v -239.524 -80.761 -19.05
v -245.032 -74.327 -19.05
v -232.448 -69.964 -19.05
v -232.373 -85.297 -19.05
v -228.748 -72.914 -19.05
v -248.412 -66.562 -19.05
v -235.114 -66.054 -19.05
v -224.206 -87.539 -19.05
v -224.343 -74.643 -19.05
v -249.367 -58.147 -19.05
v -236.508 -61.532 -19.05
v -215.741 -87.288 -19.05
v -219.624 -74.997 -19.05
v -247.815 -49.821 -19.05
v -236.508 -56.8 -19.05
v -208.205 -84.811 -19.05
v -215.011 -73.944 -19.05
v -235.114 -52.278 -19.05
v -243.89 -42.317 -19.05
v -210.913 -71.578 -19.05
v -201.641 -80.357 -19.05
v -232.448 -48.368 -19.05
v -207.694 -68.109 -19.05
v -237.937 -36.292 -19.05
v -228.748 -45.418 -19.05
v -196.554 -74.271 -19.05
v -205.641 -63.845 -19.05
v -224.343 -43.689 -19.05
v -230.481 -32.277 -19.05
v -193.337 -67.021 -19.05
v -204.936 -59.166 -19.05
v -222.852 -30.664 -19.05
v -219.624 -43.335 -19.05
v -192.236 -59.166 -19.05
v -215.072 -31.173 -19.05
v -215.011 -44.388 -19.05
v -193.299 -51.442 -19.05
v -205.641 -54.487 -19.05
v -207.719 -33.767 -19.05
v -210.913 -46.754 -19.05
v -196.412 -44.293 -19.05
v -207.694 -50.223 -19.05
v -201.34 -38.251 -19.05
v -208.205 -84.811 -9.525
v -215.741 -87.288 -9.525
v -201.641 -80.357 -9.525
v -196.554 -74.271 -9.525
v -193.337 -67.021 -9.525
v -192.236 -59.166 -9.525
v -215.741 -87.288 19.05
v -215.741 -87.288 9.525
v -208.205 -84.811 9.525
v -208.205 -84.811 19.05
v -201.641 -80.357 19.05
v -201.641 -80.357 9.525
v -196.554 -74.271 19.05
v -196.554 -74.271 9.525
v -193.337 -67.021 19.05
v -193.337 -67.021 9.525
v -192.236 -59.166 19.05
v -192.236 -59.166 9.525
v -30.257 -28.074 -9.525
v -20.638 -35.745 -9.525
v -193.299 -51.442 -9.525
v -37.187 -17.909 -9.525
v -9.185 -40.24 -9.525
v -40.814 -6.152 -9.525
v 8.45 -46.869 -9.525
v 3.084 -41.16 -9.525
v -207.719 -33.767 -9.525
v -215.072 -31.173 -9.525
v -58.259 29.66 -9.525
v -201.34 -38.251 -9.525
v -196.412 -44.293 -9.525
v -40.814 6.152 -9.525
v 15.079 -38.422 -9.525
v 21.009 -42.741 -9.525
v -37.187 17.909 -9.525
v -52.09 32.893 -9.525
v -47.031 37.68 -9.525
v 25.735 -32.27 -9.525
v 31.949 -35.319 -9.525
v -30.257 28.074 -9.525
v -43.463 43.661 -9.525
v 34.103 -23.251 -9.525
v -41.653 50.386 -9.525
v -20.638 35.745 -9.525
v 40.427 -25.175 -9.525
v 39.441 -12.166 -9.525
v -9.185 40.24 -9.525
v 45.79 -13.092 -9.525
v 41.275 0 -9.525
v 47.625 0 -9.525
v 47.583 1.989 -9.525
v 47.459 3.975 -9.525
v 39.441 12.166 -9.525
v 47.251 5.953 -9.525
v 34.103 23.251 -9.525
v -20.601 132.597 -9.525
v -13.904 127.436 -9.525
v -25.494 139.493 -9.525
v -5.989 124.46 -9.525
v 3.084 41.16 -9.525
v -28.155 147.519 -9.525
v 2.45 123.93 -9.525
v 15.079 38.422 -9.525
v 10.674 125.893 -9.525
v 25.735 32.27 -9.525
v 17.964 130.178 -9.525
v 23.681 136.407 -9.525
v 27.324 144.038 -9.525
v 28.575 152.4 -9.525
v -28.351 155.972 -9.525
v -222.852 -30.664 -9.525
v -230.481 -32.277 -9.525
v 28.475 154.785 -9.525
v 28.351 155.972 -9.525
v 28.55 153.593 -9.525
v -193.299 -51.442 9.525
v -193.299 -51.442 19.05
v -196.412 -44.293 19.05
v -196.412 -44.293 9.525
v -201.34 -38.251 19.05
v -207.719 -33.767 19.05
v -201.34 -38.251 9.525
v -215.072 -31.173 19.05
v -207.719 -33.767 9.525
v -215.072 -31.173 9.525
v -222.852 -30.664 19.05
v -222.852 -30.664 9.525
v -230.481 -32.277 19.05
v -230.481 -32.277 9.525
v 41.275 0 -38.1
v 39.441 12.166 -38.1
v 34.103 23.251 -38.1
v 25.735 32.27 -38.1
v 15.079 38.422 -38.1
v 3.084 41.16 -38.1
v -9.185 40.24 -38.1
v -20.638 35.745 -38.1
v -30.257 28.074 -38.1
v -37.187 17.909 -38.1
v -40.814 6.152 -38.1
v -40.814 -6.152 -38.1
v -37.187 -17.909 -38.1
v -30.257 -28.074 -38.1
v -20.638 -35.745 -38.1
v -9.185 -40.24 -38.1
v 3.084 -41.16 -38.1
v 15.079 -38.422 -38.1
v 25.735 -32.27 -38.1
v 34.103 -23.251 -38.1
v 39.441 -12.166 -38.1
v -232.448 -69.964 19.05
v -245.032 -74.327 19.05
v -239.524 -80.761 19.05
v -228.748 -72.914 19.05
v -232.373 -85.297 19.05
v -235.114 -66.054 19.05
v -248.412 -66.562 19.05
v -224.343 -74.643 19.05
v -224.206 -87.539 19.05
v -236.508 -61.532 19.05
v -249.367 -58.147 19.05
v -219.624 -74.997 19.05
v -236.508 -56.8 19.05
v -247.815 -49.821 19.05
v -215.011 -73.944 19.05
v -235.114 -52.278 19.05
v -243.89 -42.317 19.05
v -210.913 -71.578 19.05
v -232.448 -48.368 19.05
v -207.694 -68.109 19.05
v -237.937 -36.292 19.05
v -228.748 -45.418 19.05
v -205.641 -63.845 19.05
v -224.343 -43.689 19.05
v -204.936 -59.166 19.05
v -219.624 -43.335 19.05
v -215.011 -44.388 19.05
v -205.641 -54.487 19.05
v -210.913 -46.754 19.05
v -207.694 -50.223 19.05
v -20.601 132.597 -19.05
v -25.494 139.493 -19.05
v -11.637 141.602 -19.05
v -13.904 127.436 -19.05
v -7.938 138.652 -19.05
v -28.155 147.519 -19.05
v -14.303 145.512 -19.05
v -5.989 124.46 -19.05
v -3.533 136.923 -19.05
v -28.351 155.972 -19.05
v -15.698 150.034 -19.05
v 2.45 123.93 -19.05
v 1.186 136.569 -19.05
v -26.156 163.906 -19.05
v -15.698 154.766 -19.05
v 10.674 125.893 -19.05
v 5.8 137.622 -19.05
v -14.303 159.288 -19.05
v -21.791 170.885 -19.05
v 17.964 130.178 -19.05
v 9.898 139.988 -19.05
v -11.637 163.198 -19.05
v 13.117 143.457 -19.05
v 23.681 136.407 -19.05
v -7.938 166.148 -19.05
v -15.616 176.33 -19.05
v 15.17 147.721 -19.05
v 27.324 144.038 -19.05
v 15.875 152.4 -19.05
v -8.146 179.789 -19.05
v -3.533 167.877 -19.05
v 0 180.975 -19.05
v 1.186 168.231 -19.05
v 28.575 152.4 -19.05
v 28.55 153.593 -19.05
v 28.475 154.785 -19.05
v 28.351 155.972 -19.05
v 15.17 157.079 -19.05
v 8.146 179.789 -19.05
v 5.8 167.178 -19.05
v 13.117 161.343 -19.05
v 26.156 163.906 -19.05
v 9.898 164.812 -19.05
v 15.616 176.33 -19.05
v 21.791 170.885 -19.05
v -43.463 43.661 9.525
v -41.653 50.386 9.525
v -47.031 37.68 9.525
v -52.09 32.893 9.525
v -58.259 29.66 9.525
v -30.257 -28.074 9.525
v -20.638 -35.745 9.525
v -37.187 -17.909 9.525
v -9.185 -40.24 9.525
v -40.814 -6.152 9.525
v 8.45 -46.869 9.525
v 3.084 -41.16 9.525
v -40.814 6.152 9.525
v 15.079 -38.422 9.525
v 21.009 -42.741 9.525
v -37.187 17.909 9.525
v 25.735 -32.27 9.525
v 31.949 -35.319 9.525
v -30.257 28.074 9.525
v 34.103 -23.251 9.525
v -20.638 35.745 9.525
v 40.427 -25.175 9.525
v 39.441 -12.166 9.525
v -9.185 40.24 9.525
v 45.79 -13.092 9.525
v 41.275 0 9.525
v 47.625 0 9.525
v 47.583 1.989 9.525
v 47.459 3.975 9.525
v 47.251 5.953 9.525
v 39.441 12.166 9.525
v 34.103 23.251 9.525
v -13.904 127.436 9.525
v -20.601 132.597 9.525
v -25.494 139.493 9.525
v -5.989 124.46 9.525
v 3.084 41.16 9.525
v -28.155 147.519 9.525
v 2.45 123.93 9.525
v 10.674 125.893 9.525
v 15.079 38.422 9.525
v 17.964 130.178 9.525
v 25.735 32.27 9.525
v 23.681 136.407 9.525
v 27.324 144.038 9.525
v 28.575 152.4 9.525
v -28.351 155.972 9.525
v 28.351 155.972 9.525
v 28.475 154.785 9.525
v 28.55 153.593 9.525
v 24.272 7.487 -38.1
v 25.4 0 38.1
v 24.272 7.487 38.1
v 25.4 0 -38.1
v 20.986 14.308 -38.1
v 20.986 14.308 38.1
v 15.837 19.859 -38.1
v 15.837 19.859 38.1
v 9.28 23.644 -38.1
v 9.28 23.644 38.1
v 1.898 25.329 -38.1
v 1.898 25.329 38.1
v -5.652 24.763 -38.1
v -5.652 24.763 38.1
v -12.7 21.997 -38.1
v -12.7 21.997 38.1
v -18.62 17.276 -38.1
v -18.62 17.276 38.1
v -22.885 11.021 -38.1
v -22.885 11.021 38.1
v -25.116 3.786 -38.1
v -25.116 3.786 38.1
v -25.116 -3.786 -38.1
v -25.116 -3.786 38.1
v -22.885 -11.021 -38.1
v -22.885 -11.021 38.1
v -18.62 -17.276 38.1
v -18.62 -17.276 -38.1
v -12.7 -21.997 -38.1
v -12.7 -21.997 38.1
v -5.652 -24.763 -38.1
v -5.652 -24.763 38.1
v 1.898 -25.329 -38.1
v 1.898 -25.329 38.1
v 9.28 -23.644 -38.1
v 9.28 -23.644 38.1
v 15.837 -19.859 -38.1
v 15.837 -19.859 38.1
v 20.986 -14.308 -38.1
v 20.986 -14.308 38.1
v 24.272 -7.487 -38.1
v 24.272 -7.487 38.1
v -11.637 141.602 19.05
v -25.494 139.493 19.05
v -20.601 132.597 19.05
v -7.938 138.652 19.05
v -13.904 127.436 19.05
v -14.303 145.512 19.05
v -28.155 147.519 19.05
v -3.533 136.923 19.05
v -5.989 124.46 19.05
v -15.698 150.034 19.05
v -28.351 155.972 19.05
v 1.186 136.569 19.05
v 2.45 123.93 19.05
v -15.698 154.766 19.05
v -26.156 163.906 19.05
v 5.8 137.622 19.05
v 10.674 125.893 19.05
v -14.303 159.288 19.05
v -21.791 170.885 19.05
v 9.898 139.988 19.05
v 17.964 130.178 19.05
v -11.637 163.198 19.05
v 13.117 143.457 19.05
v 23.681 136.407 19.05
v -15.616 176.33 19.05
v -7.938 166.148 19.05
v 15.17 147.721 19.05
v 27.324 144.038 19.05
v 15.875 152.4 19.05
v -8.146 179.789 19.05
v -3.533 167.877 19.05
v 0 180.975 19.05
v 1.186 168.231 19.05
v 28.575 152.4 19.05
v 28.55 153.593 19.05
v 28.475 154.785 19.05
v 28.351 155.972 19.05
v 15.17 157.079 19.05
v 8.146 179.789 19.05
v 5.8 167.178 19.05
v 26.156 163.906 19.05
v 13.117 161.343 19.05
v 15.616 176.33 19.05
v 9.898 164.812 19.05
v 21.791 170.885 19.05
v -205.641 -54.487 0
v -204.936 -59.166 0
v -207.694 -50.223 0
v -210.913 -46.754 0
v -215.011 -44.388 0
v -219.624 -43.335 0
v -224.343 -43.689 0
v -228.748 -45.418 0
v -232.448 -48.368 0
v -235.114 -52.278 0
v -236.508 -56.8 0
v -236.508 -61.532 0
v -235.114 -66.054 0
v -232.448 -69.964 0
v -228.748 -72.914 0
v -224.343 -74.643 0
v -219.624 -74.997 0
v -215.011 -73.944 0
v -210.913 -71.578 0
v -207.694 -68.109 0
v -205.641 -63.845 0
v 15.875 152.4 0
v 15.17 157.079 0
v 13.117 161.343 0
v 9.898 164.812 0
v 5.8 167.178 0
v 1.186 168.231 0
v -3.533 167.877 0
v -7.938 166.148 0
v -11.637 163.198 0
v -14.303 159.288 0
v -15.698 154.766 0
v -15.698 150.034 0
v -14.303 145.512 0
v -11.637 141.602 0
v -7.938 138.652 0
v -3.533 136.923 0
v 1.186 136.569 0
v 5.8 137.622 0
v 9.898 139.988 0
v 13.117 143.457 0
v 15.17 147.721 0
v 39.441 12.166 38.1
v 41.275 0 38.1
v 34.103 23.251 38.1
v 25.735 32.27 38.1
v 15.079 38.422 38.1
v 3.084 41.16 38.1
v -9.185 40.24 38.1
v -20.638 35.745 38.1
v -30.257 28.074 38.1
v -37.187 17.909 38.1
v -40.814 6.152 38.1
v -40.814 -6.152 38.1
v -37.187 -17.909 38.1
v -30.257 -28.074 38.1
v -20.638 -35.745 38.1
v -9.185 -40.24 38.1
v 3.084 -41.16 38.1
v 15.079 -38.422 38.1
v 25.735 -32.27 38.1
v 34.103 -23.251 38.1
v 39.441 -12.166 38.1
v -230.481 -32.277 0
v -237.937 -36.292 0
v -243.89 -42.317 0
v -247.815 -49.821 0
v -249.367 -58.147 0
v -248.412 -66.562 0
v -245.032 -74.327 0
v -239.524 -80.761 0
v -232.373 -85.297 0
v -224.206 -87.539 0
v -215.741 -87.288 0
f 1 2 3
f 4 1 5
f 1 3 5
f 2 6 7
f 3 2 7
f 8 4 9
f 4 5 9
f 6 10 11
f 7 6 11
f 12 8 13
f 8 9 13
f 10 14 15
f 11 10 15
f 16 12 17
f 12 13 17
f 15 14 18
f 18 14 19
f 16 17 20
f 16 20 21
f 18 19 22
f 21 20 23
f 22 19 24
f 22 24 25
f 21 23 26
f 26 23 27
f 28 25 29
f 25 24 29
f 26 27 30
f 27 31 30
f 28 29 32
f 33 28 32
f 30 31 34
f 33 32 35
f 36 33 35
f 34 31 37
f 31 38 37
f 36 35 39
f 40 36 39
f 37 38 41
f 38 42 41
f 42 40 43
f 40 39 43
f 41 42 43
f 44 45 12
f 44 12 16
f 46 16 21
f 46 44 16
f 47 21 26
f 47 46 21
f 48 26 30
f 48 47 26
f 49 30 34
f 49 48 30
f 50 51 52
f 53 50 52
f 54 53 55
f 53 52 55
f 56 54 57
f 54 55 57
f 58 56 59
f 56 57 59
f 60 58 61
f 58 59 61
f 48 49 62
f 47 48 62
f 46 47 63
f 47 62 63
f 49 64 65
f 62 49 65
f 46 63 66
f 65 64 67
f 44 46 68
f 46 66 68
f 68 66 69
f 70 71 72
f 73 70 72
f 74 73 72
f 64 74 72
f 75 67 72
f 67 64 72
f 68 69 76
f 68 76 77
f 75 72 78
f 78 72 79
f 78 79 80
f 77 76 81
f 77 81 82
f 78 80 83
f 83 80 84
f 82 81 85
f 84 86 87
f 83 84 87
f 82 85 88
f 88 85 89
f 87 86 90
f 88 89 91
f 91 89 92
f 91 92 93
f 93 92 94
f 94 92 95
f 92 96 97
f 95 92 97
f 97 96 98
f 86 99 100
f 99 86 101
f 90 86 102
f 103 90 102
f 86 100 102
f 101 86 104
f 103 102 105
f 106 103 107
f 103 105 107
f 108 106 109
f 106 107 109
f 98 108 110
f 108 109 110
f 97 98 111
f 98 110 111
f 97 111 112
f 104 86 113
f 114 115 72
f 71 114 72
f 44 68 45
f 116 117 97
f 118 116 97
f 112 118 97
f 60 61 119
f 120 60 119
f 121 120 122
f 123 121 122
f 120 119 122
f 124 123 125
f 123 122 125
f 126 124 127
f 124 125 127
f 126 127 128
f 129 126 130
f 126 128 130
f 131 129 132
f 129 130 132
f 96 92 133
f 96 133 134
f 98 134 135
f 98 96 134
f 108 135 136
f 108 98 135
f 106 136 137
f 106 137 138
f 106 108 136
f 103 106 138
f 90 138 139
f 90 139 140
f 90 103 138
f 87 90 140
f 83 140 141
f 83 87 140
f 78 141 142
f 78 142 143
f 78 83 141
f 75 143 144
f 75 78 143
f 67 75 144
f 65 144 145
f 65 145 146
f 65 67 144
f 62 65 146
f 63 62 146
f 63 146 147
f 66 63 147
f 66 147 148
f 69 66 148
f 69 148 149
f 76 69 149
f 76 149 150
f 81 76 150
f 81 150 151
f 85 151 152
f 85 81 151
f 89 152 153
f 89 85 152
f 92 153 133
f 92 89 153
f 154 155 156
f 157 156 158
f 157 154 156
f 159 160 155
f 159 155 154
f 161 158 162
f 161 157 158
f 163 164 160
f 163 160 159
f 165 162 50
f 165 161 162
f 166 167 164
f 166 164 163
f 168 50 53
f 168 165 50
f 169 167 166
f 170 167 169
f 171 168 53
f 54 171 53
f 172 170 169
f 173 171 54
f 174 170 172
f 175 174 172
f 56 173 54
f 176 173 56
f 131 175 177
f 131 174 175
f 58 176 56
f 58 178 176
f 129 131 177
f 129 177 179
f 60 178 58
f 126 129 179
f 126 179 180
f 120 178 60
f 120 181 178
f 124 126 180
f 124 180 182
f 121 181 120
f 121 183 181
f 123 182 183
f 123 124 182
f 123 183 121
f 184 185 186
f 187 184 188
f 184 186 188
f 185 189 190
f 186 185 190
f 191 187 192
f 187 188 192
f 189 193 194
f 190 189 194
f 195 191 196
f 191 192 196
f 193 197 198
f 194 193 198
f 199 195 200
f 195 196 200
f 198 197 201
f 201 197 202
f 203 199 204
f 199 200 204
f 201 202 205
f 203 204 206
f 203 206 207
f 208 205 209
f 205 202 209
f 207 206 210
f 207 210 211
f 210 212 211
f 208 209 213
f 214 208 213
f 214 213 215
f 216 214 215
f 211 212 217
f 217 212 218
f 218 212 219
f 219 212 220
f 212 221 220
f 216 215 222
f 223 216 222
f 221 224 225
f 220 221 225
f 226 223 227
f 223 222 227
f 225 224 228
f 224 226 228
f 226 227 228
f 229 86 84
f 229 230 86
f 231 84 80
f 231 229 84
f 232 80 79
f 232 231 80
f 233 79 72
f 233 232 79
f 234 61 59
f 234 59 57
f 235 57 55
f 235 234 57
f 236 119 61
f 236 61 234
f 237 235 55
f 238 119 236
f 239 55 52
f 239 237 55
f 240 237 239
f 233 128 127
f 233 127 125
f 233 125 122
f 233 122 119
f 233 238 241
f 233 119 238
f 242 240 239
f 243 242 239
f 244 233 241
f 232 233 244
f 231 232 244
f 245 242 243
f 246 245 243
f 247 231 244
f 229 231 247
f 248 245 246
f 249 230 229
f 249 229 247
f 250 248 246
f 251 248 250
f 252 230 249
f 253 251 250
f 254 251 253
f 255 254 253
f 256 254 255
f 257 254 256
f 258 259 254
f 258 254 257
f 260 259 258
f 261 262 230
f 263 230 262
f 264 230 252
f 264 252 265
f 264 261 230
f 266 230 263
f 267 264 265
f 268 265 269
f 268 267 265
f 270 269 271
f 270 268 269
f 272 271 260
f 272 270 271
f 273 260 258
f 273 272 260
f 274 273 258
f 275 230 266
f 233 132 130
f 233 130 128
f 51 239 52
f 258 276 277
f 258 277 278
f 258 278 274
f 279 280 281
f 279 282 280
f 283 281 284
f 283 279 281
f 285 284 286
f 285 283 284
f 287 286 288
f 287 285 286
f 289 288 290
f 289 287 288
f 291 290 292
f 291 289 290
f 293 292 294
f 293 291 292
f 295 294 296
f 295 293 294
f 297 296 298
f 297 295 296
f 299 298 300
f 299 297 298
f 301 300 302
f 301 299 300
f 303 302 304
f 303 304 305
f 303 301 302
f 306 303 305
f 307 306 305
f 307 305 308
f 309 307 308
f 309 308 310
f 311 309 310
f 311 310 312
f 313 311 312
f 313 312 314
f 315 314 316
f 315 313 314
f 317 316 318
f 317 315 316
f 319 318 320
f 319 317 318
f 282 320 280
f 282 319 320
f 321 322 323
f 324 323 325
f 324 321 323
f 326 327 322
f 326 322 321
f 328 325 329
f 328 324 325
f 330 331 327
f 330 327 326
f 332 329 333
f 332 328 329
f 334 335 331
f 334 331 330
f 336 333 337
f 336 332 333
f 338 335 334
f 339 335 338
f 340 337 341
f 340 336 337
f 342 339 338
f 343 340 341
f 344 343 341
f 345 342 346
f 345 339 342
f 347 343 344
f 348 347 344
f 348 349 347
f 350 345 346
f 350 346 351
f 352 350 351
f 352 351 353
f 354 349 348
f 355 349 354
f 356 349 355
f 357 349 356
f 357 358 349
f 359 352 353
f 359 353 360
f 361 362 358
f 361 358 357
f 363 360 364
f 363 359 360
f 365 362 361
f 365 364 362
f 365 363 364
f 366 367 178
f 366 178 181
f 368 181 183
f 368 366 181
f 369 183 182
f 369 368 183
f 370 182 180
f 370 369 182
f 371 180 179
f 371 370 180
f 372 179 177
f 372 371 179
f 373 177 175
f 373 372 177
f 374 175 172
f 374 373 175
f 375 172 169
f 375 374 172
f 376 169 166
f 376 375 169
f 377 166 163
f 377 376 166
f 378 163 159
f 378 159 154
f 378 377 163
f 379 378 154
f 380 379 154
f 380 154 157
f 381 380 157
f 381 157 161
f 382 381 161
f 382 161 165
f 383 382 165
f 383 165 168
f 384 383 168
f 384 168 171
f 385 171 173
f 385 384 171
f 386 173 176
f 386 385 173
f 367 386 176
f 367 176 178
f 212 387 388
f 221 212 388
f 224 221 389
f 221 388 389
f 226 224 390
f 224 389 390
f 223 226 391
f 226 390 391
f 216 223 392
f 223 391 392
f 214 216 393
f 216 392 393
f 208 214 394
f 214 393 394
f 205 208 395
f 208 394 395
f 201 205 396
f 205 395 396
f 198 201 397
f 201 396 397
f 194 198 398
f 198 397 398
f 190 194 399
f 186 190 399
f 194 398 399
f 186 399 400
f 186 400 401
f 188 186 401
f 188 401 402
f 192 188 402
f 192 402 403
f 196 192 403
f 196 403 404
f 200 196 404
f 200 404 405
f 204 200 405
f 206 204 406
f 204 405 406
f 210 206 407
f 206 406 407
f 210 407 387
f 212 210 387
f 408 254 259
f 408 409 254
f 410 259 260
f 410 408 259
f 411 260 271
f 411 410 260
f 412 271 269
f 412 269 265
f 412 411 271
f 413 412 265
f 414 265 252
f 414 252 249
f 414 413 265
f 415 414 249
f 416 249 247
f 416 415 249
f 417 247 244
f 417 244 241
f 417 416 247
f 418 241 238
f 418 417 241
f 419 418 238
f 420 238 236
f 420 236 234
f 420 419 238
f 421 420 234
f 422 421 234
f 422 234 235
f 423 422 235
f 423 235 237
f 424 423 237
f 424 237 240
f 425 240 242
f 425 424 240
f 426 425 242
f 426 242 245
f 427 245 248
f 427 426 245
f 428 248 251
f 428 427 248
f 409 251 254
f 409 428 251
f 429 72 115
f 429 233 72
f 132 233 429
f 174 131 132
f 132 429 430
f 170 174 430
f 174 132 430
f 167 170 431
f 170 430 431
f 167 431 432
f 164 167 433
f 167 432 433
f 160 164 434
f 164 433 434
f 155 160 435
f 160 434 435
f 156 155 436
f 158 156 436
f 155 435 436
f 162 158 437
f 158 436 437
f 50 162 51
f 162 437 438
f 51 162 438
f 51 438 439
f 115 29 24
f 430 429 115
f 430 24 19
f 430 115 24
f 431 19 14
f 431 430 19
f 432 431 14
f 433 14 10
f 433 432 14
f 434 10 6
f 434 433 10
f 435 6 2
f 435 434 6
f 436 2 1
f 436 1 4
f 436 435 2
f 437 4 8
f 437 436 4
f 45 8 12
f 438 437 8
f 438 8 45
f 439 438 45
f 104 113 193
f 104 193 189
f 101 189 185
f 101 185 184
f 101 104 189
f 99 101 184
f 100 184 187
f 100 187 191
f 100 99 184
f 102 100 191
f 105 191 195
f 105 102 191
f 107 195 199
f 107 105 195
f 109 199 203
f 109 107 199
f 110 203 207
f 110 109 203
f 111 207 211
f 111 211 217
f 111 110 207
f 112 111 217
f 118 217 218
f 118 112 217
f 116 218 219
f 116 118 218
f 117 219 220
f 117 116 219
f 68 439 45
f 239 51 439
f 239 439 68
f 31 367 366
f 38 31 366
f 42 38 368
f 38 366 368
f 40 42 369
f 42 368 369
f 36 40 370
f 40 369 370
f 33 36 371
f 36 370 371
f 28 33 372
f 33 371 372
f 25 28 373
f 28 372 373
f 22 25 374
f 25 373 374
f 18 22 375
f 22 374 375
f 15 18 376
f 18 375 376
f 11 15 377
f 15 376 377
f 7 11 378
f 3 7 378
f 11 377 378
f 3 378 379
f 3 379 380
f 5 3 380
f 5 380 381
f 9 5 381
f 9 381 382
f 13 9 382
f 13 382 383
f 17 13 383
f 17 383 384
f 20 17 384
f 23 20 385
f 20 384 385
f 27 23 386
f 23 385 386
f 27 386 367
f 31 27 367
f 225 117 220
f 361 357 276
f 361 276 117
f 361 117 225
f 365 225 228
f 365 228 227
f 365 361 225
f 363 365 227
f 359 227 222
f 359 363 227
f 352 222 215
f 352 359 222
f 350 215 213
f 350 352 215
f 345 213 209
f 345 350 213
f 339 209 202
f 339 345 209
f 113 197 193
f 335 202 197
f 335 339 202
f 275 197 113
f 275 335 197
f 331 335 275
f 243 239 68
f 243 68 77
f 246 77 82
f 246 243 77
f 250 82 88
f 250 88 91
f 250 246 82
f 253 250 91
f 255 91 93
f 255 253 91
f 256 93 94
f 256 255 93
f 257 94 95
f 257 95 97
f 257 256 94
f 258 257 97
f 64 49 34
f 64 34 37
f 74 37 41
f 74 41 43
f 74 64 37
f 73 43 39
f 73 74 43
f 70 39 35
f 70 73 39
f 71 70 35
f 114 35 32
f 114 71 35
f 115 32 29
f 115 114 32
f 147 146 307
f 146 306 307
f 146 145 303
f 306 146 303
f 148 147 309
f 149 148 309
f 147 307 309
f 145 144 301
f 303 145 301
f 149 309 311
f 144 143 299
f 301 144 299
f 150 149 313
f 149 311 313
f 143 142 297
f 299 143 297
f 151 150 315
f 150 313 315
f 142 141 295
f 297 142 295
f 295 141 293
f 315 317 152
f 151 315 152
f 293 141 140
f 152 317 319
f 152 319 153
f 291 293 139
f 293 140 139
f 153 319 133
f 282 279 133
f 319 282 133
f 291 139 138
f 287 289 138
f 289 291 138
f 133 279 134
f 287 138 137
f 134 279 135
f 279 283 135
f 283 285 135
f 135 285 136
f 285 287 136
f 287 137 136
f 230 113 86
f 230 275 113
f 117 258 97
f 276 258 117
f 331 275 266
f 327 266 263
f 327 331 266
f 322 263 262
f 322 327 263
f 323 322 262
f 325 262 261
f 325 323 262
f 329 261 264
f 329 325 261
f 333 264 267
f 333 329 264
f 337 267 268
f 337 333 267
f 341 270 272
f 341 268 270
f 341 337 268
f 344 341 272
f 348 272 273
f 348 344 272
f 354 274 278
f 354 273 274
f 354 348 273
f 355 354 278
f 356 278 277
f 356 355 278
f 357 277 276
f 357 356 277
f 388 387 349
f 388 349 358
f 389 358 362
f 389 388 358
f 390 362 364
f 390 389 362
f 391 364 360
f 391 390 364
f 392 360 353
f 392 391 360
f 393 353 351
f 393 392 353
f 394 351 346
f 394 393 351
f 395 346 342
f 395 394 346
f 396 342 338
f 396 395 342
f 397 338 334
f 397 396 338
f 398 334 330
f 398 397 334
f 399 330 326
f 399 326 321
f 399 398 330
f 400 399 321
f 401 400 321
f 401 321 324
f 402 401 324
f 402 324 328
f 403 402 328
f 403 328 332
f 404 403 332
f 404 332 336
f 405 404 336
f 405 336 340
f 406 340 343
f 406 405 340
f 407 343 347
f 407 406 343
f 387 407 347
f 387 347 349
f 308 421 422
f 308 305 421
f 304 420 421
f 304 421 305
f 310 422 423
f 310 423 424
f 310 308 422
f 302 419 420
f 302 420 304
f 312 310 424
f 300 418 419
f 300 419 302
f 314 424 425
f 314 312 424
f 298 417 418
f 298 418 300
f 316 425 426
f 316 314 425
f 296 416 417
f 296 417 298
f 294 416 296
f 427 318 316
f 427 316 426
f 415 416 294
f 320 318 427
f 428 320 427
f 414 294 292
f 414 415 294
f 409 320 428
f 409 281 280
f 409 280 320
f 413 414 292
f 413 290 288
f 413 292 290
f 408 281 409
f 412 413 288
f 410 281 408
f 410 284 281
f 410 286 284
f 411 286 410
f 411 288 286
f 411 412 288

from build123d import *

# Parameters (mm, degrees)
F0_R     = 41.275
F1_DEPTH = 9.525
F0_R_2   = 25.4
F2_DEPTH = 38.1
F0_R_3   = 15.875
F3_DEPTH = 19.05
F4_R     = 25.4


with BuildPart() as f1:
    # F0 (on Top) → F1 (new body, symmetric)
    with BuildSketch(Plane.XY):
        with BuildLine():
            Line((-215.7407249902, -87.2876721291), (8.4498648325, -46.8693973645))
            ThreePointArc((8.4498648325, -46.8693973645), (-32.7711116329, -34.5571246973), (-47.251464821, 5.953125))
            Line((-47.251464821, 5.953125), (-43.6005938779, 34.9310147533))
            Line((-43.6005938779, 34.9310147533), (-230.4807845369, -32.277020994))
            ThreePointArc((-230.4807845369, -32.277020994), (-204.3758278578, -35.7902460874), (-192.2356438897, -59.1660337104))
            ThreePointArc((-192.2356438897, -59.1660337104), (-198.885731603, -77.4916672936), (-215.7407249902, -87.2876721291))
        make_face()
        with BuildLine():
            ThreePointArc((-47.251464821, 5.953125), (-37.1678516079, 29.7773644208), (-16.1169010787, 44.815021194))
            Line((-16.1169010787, 44.815021194), (-43.6005938779, 34.9310147533))
            Line((-43.6005938779, 34.9310147533), (-47.251464821, 5.953125))
        make_face()
        with BuildLine():
            ThreePointArc((8.4498648325, -46.8693973645), (36.5415204777, -30.5427226385), (47.625, 0))
            ThreePointArc((47.625, 0), (47.5315244711, 2.9824162099), (47.251464821, 5.953125))
            ThreePointArc((47.251464821, 5.953125), (24.8978314077, 40.598505098), (-16.1169010787, 44.815021194))
            ThreePointArc((-16.1169010787, 44.815021194), (-37.1678516079, 29.7773644208), (-47.251464821, 5.953125))
            ThreePointArc((-47.251464821, 5.953125), (-32.7711116329, -34.5571246973), (8.4498648325, -46.8693973645))
        make_face()
        Circle(F0_R, mode=Mode.SUBTRACT)
        with BuildLine():
            ThreePointArc((-16.1169010787, 44.815021194), (24.8978314077, 40.598505098), (47.251464821, 5.953125))
            Line((47.251464821, 5.953125), (28.3508788926, 155.971875))
            ThreePointArc((28.3508788926, 155.971875), (28.5189146827, 154.1894497259), (28.575, 152.4))
            ThreePointArc((28.575, 152.4), (-1.7894497259, 123.8810853173), (-28.3508788926, 155.971875))
            Line((-28.3508788926, 155.971875), (-43.6005938779, 34.9310147533))
            Line((-43.6005938779, 34.9310147533), (-16.1169010787, 44.815021194))
        make_face()
    extrude(amount=F1_DEPTH, both=True)

    # F0 (on Top) → F2 (join, symmetric)
    with BuildSketch(Plane.XY):
        Circle(F0_R)
        Circle(F0_R_2, mode=Mode.SUBTRACT)
    extrude(amount=F2_DEPTH, both=True)

    # F0 (on Top) → F3 (join, symmetric)
    with BuildSketch(Plane.XY):
        with BuildLine():
            ThreePointArc((-230.4807845369, -32.277020994), (-248.4119743759, -66.5617879242), (-215.7407249902, -87.2876721291))
            ThreePointArc((-215.7407249902, -87.2876721291), (-198.885731603, -77.4916672936), (-192.2356438897, -59.1660337104))
            ThreePointArc((-192.2356438897, -59.1660337104), (-204.3758278578, -35.7902460874), (-230.4807845369, -32.277020994))
        make_face()
        with Locations((-220.8106438897, -59.1660337104)):
            Circle(F0_R_3, mode=Mode.SUBTRACT)
        with BuildLine():
            ThreePointArc((28.575, 152.4), (28.5189146827, 154.1894497259), (28.3508788926, 155.971875))
            ThreePointArc((28.3508788926, 155.971875), (0, 180.975), (-28.3508788926, 155.971875))
            ThreePointArc((-28.3508788926, 155.971875), (-1.7894497259, 123.8810853173), (28.575, 152.4))
        make_face()
        with Locations((0, 152.4)):
            Circle(F0_R_3, mode=Mode.SUBTRACT)
    extrude(amount=F3_DEPTH, both=True)

    # F4
    f4_edges = [f1.edges().sort_by_distance(p)[0] for p in [
        (-43.600594, 34.931015, 0),
    ]]
    fillet(f4_edges, radius=F4_R)


solid = f1.part
